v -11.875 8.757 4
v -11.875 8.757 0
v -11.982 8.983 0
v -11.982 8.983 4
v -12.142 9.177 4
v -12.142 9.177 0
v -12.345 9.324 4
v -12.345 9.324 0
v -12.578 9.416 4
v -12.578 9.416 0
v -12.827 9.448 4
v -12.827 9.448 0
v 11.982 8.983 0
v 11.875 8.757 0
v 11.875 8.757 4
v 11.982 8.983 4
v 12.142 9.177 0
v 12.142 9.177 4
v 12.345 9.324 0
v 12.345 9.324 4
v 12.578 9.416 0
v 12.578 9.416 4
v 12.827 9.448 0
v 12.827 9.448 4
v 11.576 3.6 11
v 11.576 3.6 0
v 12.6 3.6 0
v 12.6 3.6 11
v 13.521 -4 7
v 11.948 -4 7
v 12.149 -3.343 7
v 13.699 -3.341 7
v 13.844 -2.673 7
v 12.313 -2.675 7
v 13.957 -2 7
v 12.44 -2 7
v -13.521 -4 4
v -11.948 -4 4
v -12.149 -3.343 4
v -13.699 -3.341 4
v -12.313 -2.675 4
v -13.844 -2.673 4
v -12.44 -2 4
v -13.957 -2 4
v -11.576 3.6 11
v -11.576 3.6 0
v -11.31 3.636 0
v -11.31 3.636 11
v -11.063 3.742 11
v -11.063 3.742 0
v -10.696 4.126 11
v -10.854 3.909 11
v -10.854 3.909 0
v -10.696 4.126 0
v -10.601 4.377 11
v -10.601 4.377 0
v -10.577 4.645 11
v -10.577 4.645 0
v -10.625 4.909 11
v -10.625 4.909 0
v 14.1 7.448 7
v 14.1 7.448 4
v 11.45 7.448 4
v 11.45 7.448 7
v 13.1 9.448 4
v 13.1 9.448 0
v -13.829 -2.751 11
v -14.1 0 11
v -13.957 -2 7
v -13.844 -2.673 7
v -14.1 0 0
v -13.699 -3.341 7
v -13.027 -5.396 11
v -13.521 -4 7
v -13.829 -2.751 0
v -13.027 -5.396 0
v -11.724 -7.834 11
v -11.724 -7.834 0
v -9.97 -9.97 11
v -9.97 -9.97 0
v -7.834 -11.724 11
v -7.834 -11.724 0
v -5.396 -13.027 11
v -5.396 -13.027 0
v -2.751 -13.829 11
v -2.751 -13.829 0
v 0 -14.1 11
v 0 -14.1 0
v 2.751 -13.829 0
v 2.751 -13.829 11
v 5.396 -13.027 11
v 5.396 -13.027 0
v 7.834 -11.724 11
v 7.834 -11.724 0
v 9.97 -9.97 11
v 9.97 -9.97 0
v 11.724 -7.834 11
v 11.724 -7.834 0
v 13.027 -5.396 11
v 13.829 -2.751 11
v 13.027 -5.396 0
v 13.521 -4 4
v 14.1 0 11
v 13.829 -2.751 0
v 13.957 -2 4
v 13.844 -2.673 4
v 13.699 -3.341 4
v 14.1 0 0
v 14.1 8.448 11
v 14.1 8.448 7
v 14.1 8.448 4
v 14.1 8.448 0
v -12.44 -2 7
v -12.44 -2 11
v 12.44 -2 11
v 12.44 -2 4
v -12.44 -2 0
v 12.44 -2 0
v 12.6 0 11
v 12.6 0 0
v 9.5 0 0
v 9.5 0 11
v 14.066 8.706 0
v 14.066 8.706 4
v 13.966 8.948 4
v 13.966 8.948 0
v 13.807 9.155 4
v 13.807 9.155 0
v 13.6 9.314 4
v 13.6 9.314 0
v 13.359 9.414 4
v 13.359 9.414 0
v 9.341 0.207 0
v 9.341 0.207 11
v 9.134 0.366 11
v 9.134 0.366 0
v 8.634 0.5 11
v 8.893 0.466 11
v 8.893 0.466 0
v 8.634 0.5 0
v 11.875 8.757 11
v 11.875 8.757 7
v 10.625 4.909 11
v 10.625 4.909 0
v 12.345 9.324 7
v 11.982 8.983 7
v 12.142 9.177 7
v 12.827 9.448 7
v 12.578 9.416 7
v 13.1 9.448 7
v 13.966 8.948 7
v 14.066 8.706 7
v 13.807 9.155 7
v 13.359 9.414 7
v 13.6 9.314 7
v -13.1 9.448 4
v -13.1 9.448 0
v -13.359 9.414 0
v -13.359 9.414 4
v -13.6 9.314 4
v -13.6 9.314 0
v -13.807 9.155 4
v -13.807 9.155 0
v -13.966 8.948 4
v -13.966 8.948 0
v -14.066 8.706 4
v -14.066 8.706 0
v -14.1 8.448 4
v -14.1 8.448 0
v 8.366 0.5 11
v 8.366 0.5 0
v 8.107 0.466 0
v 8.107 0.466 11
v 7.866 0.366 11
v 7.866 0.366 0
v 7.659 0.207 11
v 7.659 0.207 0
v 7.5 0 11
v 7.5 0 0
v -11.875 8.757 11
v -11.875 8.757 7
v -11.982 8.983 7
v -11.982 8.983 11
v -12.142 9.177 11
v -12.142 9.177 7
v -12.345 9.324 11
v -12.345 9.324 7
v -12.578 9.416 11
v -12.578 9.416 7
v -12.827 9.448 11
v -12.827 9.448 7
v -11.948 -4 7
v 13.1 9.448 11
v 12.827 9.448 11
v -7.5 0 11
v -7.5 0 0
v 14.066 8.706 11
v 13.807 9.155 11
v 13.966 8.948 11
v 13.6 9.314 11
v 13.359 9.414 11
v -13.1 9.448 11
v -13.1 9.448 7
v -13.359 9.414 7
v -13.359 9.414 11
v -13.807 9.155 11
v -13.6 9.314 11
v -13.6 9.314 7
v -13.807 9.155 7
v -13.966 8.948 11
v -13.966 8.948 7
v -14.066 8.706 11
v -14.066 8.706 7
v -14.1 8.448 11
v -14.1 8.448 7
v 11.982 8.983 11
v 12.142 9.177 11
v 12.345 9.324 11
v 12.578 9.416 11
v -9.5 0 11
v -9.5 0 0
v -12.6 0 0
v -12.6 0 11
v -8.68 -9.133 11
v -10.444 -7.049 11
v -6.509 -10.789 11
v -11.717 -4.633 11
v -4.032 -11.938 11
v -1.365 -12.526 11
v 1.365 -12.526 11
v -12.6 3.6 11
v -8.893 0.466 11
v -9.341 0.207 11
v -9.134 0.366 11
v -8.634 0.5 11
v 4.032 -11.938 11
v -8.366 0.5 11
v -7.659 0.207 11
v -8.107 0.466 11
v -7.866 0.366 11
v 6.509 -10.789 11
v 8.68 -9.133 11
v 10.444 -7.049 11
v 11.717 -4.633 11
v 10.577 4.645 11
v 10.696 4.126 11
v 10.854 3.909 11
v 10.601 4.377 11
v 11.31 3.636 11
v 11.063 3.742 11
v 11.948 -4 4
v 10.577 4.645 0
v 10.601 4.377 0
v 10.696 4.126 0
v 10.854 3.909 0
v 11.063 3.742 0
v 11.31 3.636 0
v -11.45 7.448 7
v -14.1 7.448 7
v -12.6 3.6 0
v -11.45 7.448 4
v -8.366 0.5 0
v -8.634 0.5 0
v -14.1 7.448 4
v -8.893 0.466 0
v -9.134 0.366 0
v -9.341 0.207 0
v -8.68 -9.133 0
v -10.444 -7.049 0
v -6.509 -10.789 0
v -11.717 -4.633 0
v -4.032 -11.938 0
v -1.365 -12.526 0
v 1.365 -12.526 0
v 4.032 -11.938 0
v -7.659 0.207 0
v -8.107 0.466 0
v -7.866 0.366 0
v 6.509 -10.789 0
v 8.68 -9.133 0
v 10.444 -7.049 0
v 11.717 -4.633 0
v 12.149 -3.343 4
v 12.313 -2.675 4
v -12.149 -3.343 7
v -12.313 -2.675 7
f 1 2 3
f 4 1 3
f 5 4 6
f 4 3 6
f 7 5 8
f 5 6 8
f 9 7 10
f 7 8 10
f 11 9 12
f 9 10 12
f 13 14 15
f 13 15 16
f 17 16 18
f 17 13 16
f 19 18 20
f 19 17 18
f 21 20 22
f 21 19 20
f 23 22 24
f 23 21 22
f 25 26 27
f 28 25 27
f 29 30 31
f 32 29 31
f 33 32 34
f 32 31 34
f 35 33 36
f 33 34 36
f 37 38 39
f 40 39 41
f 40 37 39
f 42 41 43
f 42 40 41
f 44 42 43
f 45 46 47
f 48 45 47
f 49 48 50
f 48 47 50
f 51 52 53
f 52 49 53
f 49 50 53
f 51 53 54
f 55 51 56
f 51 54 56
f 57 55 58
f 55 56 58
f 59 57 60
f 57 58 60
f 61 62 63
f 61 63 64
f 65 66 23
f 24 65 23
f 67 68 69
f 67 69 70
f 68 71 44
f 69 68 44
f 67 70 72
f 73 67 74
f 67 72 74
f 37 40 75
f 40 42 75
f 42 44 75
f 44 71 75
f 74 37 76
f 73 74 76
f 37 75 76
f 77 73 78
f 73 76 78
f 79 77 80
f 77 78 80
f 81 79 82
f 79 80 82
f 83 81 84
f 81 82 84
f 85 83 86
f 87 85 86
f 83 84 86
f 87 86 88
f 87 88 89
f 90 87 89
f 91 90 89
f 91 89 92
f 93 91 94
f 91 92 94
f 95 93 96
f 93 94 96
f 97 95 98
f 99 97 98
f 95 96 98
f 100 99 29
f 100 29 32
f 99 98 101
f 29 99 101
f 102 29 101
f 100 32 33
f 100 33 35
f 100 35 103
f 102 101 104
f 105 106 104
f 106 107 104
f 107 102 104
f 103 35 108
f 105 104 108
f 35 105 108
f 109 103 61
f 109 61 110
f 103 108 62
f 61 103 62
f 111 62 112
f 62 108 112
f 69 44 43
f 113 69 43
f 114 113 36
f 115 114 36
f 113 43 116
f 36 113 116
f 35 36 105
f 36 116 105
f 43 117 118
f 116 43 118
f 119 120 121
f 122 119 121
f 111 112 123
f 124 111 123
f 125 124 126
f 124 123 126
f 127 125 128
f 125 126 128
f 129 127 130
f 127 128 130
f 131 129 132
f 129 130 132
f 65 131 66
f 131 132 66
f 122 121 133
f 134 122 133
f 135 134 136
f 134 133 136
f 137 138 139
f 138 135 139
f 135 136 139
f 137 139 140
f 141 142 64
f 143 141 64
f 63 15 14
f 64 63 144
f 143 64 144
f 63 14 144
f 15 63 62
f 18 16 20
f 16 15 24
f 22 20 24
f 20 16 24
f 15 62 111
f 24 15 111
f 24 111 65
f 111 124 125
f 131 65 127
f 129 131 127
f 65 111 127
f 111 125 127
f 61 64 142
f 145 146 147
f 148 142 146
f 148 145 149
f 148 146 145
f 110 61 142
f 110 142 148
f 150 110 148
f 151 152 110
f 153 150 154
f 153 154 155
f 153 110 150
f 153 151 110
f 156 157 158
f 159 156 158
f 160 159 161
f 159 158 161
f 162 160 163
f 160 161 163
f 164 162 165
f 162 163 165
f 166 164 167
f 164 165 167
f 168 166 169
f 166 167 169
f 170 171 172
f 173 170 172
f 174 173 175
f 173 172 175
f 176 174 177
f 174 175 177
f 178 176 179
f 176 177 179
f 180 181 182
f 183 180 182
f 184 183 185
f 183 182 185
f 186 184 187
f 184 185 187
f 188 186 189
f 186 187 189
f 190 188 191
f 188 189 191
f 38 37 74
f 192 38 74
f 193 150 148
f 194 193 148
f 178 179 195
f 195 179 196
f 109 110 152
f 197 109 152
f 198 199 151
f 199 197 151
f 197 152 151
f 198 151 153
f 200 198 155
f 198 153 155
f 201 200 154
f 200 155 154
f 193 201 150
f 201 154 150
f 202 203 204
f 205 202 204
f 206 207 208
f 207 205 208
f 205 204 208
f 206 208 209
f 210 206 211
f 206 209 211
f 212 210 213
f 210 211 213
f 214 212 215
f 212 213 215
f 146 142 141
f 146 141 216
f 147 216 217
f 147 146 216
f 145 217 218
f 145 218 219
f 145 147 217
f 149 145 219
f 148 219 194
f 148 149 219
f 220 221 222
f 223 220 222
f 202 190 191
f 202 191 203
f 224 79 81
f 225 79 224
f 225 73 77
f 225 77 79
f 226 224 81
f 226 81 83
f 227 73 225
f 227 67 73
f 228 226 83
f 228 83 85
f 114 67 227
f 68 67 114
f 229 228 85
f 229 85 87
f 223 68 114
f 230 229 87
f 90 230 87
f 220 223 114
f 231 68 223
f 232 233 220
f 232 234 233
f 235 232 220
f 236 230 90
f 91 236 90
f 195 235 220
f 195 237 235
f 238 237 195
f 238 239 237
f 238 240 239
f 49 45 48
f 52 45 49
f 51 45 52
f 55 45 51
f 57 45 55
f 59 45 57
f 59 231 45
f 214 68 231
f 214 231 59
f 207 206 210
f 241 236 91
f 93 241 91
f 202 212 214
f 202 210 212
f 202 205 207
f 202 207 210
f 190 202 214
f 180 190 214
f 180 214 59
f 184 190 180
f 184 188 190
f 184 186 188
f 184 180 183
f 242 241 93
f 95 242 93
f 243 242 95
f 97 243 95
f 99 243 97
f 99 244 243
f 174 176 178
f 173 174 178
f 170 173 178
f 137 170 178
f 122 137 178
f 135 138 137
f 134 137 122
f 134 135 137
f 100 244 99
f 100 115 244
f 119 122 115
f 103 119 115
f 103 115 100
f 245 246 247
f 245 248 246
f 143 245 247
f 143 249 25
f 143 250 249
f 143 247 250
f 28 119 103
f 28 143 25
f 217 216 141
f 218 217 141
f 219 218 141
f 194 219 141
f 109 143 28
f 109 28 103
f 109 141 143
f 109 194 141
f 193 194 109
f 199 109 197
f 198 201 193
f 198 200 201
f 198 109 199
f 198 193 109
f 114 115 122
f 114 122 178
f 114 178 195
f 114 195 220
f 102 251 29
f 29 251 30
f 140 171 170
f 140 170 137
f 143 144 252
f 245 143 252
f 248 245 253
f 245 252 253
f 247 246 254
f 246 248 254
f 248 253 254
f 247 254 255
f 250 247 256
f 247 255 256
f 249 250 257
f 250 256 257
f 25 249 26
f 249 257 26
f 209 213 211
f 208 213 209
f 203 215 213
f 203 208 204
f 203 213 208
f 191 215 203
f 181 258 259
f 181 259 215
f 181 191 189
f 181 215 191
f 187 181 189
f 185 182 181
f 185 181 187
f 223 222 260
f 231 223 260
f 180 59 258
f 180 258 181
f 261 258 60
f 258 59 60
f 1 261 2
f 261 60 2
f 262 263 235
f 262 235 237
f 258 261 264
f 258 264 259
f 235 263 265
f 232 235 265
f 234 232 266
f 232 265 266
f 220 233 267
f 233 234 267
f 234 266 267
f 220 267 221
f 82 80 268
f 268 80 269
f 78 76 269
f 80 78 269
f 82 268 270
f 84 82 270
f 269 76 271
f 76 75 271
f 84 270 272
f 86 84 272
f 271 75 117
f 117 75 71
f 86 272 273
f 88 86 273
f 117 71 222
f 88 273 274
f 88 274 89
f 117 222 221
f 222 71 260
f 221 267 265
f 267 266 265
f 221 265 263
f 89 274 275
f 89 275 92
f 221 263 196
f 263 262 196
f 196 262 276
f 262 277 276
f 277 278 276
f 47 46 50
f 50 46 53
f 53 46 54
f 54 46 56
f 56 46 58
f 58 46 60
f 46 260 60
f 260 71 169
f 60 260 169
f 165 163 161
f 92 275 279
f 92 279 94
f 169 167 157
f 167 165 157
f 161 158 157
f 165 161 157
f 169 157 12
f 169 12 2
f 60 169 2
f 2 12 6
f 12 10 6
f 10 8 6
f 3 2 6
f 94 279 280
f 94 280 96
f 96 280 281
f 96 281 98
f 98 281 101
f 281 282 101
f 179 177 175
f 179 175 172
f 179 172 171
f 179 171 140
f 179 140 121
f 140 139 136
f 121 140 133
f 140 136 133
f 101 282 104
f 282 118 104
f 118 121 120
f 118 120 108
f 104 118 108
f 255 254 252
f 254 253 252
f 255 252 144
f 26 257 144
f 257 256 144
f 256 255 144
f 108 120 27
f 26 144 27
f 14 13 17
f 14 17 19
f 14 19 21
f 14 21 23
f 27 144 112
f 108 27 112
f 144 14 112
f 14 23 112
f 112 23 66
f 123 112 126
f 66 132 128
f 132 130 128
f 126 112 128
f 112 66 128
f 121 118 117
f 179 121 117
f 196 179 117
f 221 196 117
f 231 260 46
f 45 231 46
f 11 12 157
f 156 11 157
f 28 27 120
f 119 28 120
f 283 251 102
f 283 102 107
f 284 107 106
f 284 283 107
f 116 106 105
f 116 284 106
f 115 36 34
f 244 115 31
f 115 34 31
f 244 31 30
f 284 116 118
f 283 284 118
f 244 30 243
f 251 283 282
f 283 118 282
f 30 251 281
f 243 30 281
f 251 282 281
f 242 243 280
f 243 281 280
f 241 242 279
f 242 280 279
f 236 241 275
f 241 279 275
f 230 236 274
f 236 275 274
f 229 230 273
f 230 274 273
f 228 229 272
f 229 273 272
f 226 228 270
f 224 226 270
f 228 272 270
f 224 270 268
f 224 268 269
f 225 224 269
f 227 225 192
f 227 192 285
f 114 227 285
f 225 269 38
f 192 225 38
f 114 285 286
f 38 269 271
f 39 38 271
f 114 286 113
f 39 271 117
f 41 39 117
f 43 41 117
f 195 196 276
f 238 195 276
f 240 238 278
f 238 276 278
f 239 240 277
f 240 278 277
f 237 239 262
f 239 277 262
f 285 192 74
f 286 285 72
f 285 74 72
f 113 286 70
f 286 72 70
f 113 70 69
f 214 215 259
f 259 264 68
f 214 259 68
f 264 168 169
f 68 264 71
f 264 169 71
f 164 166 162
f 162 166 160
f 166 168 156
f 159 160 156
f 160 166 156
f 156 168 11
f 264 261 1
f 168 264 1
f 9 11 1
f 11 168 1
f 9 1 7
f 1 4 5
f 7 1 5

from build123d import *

# Parameters (mm, degrees)
F0_W        = 2
F0_H        = 0.5
F1_DEPTH    = 11
F2_T1_DEPTH = 17.8819096024
F2_T3_DEPTH = 16
F2_T5_DEPTH = 14.63271264
F2_T7_DEPTH = 15.3301270189
F3_W        = 2
F3_H        = 3
F4_DEPTH    = 15


# Not quite as in the source:
# - a fillet or chamfer that OpenCascade refuses, or shapes differently, is made with other operations: its cross-section is extruded or revolved along the edge and cut away or added


with BuildPart() as f1:
    # F0 (on Top) → F1 (new body)
    with BuildSketch(Plane.XY):
        with BuildLine():
            Line((-14.1, 9.4475987206), (-14.1, 0))
            ThreePointArc((-14.1, 0), (0, -14.1), (14.1, 0))
            Line((14.1, 0), (14.1, 9.4475987206))
            Line((14.1, 9.4475987206), (12.1, 9.4475987206))
            Line((12.1, 9.4475987206), (10.2, 3.6))
            Line((10.2, 3.6), (12.6, 3.6))
            Line((12.6, 3.6), (12.6, 0))
            Line((12.6, 0), (9.5, 0))
            Line((9.5, 0), (7.5, 0))
            Line((7.5, 0), (0, 0))
            Line((0, 0), (-7.5, 0))
            Line((-7.5, 0), (-9.5, 0))
            Line((-9.5, 0), (-12.6, 0))
            Line((-12.6, 0), (-12.6, 3.6))
            Line((-12.6, 3.6), (-10.2, 3.6))
            Line((-10.2, 3.6), (-12.1, 9.4475987206))
            Line((-12.1, 9.4475987206), (-14.1, 9.4475987206))
        make_face()
        with BuildLine():
            ThreePointArc((12.4402572321, -2), (0, -12.6), (-12.4402572321, -2))
            Line((-12.4402572321, -2), (12.4402572321, -2))
        make_face(mode=Mode.SUBTRACT)
        with Locations((-8.5, 0.25)):
            Rectangle(F0_W, F0_H)
        with Locations((8.5, 0.25)):
            Rectangle(F0_W, F0_H)
    extrude(amount=F1_DEPTH)

    # F2: fillet of radius 1 on 10 edges, made by hand

    # F2_s2 → F2_t1 (cut)
    with BuildSketch(Plane.XY.offset(-3.4409548012)):
        with BuildLine():
            ThreePointArc((-11.5763819205, 3.6), (-10.7673649261, 4.0122147477), (-10.6253254042, 4.9090169944))
            Line((-10.6253254042, 4.9090169944), (-10.2, 3.6))
            Line((-10.2, 3.6), (-11.5763819205, 3.6))
        make_face()
        with BuildLine():
            ThreePointArc((10.6253254042, 4.9090169944), (10.7673649261, 4.0122147477), (11.5763819205, 3.6))
            Line((11.5763819205, 3.6), (10.2, 3.6))
            Line((10.2, 3.6), (10.6253254042, 4.9090169944))
        make_face()
    extrude(amount=F2_T1_DEPTH, mode=Mode.SUBTRACT)

    # F2_s4 → F2_t3 (cut)
    with BuildSketch(Plane.XY.offset(-2.5)):
        with BuildLine():
            ThreePointArc((-13.1, 9.4475987206), (-13.8071067812, 9.1547055018), (-14.1, 8.4475987206))
            Line((-14.1, 8.4475987206), (-14.1, 9.4475987206))
            Line((-14.1, 9.4475987206), (-13.1, 9.4475987206))
        make_face()
        with BuildLine():
            ThreePointArc((14.1, 8.4475987206), (13.8071067812, 9.1547055018), (13.1, 9.4475987206))
            Line((13.1, 9.4475987206), (14.1, 9.4475987206))
            Line((14.1, 9.4475987206), (14.1, 8.4475987206))
        make_face()
    extrude(amount=F2_T3_DEPTH, mode=Mode.SUBTRACT)

    # F2_s6 → F2_t5 (cut)
    with BuildSketch(Plane.XY.offset(-1.81635632)):
        with BuildLine():
            ThreePointArc((-11.8754860117, 8.756615715), (-12.2387572757, 9.256615715), (-12.826542528, 9.4475987206))
            Line((-12.826542528, 9.4475987206), (-12.1, 9.4475987206))
            Line((-12.1, 9.4475987206), (-11.8754860117, 8.756615715))
        make_face()
        with BuildLine():
            ThreePointArc((11.8754860117, 8.756615715), (12.2387572757, 9.256615715), (12.826542528, 9.4475987206))
            Line((12.826542528, 9.4475987206), (12.1, 9.4475987206))
            Line((12.1, 9.4475987206), (11.8754860117, 8.756615715))
        make_face()
    extrude(amount=F2_T5_DEPTH, mode=Mode.SUBTRACT)

    # F2_s8 → F2_t7 (cut)
    with BuildSketch(Plane.XY.offset(-2.1650635095)):
        with BuildLine():
            ThreePointArc((-8.6339745962, 0.5), (-9.1339745962, 0.3660254038), (-9.5, 0))
            Line((-9.5, 0), (-9.5, 0.5))
            Line((-9.5, 0.5), (-8.6339745962, 0.5))
        make_face()
        with BuildLine():
            ThreePointArc((-7.5, 0), (-7.8660254038, 0.3660254038), (-8.3660254038, 0.5))
            Line((-8.3660254038, 0.5), (-7.5, 0.5))
            Line((-7.5, 0.5), (-7.5, 0))
        make_face()
        with BuildLine():
            ThreePointArc((8.3660254038, 0.5), (7.8660254038, 0.3660254038), (7.5, 0))
            Line((7.5, 0), (7.5, 0.5))
            Line((7.5, 0.5), (8.3660254038, 0.5))
        make_face()
        with BuildLine():
            ThreePointArc((9.5, 0), (9.1339745962, 0.3660254038), (8.6339745962, 0.5))
            Line((8.6339745962, 0.5), (9.5, 0.5))
            Line((9.5, 0.5), (9.5, 0))
        make_face()
    extrude(amount=F2_T7_DEPTH, mode=Mode.SUBTRACT)

    # F3 (on Right) → F4 (cut, symmetric)
    with BuildSketch(Plane.YZ):
        with Locations((-3, 5.5)):
            Rectangle(F3_W, F3_H)
        with Locations((8.4475987206, 5.5)):
            Rectangle(F3_W, F3_H)
    extrude(amount=F4_DEPTH, both=True, mode=Mode.SUBTRACT)


solid = f1.part
